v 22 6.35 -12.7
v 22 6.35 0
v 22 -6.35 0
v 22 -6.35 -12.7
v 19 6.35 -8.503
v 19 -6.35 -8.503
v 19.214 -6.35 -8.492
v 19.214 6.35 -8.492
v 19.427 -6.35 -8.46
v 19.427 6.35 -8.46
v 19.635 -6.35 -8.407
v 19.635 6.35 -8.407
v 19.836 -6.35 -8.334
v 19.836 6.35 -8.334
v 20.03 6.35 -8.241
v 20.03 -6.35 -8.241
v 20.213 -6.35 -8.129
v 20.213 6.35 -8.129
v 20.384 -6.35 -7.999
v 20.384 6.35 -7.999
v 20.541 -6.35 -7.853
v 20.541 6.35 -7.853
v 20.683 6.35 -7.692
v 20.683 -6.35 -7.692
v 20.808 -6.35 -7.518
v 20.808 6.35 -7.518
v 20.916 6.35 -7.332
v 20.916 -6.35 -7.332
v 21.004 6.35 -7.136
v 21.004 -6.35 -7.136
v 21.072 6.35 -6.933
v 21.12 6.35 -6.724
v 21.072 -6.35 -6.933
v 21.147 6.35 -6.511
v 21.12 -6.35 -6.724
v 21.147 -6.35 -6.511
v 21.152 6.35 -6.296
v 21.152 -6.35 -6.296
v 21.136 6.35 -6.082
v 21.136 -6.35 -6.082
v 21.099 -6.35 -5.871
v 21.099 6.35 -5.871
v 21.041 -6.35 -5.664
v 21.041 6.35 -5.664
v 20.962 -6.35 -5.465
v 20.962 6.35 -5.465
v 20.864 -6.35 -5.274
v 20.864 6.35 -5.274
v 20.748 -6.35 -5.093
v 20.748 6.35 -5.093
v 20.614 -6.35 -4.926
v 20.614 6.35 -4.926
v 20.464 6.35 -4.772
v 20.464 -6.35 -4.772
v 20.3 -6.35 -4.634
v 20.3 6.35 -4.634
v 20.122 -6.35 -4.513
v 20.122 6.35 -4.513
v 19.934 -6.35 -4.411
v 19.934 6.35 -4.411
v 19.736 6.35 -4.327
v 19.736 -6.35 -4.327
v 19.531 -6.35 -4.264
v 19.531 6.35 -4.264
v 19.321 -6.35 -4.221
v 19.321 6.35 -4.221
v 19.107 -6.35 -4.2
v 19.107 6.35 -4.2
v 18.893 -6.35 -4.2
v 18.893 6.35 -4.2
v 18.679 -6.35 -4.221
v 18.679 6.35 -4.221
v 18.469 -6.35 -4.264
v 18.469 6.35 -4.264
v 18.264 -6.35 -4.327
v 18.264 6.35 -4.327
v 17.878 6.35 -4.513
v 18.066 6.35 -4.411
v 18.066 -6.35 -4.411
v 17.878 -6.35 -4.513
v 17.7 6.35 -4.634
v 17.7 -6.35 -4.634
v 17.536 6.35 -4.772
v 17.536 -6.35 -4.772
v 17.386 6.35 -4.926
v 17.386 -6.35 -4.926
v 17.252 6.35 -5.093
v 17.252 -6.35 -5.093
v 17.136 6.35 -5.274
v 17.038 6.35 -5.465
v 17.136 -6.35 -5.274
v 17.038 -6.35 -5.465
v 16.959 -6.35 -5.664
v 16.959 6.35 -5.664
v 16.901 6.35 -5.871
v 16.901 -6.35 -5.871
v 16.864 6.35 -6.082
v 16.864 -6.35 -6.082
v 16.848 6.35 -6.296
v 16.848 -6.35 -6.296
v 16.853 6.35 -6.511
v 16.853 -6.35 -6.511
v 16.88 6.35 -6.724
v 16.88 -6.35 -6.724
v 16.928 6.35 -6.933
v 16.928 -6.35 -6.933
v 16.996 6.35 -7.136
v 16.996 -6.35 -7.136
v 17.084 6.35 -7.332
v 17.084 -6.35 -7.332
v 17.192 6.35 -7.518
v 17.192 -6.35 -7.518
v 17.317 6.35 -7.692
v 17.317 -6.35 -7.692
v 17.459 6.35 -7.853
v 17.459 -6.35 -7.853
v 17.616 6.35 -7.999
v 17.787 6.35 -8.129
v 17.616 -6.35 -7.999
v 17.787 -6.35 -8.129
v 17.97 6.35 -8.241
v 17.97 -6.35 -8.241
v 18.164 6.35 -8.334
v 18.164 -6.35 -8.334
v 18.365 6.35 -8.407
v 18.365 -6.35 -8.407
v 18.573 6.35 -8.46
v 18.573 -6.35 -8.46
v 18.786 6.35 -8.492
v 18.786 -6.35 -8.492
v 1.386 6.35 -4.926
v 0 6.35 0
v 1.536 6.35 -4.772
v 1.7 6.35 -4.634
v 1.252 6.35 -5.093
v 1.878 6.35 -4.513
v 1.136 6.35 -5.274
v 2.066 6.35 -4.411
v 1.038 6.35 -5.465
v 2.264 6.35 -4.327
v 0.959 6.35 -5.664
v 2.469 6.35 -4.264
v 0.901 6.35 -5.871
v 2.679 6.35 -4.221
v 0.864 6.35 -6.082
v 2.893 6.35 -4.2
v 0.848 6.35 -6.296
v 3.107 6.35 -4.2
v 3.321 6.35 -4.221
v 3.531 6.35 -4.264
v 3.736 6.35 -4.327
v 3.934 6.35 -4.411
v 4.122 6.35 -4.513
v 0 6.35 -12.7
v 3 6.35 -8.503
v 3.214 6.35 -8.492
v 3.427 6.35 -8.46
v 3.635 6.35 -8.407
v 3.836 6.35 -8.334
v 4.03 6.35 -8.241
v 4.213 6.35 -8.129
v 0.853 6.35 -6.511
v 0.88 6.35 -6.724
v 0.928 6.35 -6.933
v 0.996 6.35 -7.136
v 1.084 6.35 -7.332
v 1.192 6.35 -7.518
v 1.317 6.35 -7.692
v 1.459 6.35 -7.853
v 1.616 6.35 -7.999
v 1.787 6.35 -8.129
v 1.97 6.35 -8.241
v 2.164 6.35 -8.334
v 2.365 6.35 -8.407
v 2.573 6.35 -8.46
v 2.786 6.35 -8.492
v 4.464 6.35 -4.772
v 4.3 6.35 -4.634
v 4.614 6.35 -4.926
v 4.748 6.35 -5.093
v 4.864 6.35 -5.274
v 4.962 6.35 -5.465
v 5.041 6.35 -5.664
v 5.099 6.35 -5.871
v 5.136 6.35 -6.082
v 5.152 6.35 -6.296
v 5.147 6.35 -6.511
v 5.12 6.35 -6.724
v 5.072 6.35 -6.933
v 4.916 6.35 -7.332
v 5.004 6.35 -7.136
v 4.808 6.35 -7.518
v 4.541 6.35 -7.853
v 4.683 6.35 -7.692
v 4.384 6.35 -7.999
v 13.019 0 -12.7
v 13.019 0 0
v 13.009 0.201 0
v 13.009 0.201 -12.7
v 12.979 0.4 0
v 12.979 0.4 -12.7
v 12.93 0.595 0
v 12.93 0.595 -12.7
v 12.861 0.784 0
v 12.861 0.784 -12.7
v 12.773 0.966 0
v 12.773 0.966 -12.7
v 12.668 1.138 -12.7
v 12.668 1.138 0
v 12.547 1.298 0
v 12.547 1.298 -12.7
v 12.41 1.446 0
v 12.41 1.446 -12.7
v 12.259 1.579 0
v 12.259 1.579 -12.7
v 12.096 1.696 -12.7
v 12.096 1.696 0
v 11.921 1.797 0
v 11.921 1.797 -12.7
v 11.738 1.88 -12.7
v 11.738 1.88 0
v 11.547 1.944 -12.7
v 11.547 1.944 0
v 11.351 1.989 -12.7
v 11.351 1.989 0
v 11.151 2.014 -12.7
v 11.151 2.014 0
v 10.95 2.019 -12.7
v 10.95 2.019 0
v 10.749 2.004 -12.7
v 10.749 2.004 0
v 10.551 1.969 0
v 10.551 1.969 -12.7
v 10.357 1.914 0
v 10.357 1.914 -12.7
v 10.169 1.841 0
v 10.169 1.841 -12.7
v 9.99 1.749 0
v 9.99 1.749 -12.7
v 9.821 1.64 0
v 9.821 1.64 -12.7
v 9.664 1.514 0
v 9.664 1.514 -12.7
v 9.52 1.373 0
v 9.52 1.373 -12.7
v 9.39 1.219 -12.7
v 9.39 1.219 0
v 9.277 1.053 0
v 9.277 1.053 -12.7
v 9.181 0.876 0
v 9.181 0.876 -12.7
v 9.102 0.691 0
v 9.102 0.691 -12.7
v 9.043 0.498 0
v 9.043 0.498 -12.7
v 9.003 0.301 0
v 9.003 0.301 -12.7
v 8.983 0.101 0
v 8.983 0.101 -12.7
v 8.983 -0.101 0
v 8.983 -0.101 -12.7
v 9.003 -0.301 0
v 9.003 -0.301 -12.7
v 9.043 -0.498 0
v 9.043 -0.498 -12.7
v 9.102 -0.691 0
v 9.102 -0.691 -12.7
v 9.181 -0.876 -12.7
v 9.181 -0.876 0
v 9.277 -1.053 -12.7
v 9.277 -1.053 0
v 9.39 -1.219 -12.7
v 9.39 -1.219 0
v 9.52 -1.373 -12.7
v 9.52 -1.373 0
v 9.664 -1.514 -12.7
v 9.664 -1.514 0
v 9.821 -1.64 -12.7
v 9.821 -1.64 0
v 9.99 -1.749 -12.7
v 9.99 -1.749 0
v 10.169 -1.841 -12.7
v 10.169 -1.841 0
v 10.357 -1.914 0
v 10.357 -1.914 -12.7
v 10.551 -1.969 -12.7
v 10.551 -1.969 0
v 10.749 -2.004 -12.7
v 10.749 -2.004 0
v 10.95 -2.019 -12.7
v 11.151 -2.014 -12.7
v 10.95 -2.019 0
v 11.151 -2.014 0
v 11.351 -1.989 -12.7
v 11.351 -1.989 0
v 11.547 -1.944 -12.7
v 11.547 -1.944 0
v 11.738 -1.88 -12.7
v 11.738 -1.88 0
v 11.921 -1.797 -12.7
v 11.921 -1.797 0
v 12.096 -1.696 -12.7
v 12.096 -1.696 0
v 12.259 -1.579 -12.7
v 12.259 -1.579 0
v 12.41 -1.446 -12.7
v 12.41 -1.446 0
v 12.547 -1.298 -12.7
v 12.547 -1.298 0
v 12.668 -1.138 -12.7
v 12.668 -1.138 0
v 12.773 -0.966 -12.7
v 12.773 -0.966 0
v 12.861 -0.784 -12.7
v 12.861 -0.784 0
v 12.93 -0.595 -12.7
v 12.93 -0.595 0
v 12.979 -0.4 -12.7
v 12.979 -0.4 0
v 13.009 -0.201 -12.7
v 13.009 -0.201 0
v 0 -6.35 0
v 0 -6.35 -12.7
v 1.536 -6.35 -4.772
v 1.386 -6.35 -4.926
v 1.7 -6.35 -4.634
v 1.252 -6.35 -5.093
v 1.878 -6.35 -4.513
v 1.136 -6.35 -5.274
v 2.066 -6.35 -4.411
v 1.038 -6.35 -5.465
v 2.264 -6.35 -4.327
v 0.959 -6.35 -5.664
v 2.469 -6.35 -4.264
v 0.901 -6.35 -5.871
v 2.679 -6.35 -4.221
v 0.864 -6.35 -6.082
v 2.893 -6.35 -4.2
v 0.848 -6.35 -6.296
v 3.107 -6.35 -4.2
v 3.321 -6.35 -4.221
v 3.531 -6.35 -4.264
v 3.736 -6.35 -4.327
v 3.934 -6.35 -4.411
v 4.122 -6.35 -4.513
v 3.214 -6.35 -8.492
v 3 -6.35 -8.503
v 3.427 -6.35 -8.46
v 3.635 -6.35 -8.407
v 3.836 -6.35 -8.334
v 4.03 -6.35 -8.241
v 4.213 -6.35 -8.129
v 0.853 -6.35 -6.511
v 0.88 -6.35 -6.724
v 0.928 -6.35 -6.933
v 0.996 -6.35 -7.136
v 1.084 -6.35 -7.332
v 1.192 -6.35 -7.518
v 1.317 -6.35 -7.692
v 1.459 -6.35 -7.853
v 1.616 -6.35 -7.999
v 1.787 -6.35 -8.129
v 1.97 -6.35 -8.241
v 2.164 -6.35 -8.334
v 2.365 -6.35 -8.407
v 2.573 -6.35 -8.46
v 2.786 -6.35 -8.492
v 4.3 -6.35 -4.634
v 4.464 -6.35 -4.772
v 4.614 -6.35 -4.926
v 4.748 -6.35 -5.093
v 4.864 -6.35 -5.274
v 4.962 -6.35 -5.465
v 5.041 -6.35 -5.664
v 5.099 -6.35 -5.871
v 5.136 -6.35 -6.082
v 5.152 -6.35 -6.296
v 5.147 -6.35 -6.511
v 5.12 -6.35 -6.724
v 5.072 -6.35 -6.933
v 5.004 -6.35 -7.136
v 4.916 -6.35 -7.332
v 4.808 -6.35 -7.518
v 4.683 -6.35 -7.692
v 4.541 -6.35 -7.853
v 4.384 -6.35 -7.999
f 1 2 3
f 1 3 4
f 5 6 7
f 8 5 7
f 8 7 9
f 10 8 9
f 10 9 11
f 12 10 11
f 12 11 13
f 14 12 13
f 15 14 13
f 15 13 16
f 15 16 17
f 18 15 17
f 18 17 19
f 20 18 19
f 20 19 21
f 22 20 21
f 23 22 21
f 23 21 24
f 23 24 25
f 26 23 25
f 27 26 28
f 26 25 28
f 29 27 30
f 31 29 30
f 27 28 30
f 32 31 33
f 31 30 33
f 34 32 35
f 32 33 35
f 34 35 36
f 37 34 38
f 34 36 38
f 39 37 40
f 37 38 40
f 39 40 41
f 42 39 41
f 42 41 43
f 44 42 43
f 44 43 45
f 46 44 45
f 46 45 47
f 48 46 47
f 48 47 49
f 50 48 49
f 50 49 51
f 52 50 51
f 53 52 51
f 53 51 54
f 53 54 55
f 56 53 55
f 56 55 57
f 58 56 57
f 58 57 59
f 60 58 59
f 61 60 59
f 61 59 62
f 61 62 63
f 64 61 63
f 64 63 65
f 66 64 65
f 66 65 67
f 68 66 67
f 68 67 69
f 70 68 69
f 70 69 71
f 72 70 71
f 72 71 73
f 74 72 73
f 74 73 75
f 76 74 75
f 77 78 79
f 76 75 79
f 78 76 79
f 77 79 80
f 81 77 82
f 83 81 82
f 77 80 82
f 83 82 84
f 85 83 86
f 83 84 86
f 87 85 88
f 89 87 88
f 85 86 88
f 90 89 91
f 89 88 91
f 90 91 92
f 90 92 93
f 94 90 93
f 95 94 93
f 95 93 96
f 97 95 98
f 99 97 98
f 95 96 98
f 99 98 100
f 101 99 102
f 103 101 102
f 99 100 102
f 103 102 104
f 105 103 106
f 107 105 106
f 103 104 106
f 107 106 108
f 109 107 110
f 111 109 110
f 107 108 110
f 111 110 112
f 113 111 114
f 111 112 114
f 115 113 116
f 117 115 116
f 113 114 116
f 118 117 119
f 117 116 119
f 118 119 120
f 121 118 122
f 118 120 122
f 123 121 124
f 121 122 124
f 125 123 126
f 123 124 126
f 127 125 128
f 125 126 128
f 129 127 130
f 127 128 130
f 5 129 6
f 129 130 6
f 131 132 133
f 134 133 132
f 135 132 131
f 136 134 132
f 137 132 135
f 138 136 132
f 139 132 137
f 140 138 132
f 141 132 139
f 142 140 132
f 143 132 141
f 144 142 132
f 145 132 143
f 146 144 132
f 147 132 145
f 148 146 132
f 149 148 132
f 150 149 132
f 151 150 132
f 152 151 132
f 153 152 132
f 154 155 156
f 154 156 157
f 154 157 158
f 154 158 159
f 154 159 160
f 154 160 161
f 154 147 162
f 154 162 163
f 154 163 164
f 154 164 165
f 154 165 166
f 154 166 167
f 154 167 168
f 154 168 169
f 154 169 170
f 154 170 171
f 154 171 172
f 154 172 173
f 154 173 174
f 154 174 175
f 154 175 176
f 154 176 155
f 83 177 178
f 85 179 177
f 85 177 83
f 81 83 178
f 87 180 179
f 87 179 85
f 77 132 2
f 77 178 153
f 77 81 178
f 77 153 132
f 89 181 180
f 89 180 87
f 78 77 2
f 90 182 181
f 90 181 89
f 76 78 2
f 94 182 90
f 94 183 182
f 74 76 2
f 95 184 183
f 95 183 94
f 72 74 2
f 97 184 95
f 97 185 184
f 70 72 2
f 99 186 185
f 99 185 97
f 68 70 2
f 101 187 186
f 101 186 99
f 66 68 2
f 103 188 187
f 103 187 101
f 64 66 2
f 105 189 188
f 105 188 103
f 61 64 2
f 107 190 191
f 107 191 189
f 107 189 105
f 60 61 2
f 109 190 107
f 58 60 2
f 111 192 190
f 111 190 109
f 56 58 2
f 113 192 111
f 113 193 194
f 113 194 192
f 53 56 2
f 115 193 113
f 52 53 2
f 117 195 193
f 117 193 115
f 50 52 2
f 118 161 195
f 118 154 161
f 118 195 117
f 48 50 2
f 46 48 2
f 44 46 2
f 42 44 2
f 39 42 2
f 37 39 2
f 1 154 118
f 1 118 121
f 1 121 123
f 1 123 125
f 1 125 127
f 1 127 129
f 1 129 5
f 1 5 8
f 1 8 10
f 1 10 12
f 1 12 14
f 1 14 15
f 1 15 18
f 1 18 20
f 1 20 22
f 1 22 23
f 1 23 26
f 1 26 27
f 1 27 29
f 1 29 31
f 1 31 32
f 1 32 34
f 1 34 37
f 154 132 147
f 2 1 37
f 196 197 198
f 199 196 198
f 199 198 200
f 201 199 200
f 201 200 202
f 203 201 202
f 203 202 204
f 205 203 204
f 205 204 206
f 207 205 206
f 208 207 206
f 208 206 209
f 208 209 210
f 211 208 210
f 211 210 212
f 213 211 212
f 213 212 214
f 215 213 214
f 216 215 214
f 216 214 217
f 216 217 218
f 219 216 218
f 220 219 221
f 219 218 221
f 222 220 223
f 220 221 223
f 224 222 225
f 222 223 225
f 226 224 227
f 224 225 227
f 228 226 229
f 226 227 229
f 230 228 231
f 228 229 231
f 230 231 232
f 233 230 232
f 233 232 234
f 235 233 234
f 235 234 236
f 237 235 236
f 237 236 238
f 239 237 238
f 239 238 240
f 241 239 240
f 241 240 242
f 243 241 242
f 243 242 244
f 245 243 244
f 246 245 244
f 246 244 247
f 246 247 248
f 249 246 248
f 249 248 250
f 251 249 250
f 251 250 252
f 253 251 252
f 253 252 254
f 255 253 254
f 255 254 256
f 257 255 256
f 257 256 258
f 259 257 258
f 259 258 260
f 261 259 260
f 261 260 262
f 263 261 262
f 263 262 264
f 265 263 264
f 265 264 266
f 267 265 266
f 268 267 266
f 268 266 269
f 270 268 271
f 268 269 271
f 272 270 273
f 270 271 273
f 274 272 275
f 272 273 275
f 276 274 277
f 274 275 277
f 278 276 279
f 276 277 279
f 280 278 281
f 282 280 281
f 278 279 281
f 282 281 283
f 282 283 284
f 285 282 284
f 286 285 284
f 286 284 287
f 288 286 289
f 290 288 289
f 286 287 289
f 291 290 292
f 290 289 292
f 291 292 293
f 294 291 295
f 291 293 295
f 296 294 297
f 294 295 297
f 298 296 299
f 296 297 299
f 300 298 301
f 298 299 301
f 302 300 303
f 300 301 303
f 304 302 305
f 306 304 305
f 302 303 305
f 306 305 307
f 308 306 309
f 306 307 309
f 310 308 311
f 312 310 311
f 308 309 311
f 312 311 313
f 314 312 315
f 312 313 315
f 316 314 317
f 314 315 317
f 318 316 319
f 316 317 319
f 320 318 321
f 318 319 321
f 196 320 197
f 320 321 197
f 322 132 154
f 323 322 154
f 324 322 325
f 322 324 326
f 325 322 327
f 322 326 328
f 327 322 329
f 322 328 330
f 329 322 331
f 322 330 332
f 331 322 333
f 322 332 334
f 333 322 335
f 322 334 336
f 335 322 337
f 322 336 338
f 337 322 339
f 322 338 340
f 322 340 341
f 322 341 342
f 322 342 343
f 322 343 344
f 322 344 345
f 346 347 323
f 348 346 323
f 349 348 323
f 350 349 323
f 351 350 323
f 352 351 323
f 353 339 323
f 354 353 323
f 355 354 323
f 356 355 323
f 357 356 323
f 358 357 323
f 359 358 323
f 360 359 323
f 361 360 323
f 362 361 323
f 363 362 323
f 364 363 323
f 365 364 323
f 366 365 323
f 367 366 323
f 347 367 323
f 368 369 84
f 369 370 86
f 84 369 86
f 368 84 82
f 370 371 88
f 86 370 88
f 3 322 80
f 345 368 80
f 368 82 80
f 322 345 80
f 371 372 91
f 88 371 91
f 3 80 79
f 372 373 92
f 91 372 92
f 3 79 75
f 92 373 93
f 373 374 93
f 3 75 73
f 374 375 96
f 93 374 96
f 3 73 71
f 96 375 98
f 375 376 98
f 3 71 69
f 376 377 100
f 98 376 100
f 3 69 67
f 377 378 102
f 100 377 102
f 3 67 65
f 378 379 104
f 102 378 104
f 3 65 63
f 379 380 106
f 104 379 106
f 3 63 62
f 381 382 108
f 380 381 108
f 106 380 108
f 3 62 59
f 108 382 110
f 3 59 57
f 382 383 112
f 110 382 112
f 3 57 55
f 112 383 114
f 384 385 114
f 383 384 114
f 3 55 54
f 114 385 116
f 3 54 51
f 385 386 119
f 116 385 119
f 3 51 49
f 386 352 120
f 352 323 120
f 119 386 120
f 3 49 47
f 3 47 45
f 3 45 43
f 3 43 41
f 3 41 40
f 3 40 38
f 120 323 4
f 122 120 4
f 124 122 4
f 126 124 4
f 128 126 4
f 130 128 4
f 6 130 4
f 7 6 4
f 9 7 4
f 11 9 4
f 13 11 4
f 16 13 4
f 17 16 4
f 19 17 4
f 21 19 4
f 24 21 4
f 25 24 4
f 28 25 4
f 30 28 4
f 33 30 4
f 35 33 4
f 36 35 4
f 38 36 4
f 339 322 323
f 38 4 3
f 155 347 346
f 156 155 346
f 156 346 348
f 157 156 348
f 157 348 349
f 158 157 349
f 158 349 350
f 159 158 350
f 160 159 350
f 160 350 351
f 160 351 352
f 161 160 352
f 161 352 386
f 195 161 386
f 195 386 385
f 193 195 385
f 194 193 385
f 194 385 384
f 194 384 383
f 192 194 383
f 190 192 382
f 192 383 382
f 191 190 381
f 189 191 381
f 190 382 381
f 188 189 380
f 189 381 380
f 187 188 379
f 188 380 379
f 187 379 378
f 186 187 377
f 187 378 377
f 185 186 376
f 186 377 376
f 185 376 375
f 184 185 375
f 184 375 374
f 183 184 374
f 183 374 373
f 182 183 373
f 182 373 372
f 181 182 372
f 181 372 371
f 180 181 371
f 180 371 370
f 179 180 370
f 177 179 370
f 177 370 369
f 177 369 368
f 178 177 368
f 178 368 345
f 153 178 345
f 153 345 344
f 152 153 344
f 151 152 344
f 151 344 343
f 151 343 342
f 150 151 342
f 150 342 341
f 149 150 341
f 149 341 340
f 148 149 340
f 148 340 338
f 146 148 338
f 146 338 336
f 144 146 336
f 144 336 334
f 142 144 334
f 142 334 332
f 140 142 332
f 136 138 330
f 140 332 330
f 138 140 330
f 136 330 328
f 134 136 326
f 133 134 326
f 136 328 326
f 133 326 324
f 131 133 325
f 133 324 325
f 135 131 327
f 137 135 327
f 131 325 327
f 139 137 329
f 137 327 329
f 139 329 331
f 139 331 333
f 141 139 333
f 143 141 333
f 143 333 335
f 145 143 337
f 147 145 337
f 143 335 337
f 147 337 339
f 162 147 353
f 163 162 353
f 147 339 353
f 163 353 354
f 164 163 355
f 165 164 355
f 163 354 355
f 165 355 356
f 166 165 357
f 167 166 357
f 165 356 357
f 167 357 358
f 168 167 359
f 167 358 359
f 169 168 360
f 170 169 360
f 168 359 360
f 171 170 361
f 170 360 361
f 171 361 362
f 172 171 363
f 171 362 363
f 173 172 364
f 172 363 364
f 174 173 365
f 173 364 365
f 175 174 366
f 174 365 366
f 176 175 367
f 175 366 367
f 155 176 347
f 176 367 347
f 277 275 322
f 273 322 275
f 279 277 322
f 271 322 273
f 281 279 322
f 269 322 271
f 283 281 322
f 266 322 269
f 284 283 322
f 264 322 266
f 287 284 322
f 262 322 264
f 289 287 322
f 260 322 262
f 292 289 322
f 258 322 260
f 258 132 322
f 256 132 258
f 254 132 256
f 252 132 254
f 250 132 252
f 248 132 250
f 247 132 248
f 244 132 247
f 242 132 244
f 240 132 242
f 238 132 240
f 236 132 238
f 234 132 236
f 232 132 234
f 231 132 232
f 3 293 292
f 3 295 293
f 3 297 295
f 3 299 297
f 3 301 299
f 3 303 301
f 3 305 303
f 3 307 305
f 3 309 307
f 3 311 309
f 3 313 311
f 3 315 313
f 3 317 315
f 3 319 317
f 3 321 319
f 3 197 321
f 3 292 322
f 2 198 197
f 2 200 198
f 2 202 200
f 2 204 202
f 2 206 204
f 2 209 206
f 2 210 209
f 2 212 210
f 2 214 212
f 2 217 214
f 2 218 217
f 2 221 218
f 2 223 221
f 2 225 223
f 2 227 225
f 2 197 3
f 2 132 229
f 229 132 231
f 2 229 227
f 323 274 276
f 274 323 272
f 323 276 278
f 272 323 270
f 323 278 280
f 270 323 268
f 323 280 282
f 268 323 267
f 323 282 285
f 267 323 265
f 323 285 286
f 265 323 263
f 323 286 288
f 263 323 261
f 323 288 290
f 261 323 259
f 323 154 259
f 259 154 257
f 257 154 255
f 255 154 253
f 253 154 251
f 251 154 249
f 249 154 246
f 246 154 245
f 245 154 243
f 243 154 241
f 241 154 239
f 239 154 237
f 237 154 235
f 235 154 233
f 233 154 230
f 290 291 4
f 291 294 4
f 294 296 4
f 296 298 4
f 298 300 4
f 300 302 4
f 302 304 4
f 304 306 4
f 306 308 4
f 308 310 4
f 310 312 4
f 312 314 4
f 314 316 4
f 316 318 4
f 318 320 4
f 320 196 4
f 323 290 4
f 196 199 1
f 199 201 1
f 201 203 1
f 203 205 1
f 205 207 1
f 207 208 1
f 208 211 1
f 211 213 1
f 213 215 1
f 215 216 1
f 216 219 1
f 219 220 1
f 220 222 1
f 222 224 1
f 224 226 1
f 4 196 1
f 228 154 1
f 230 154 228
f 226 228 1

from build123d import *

# Parameters (mm, degrees)
SKETCH1_W                    = 22.000000004
SKETCH1_H                    = 12.7
BOSS_EXTRUDE1_DEPTH          = 6.35
F_18_0_1695_DIAMETER_HOLE1_D = 4.3053
F_18_0_1695_DIAMETER_HOLE2_D = 4.3053
F_10_32_TAPPED_HOLE1_D       = 4.0386


with BuildPart() as part:
    # Sketch1 → Boss-Extrude1 (new, symmetric)
    with BuildSketch(Plane(origin=(0, 0, 0), x_dir=(1, 0, 0), z_dir=(0, 1, 0))):
        with Locations((11.000000002, 6.35)):
            Rectangle(SKETCH1_W, SKETCH1_H)
    extrude(amount=BOSS_EXTRUDE1_DEPTH, both=True)

    # #18 (0.1695) Diameter Hole1 (through all)
    with Locations(Plane(origin=(3, 6.35, -6.35), x_dir=(0, 0, 1), z_dir=(0, 1, 0))):
        with Locations((0, 0)):
            Hole(F_18_0_1695_DIAMETER_HOLE1_D / 2)

    # #18 (0.1695) Diameter Hole2 (through all)
    with Locations(Plane(origin=(19.000000004, 6.35, -6.35), x_dir=(0, 0, 1), z_dir=(0, 1, 0))):
        with Locations((0, 0)):
            Hole(F_18_0_1695_DIAMETER_HOLE2_D / 2)

    # #10-32 Tapped Hole1 (through all)
    with Locations(Plane(origin=(11.000000002, 0, -12.7), x_dir=(-1, 0, 0), z_dir=(0, 0, -1))):
        with Locations((0, 0)):
            Hole(F_10_32_TAPPED_HOLE1_D / 2)


solid = part.part
